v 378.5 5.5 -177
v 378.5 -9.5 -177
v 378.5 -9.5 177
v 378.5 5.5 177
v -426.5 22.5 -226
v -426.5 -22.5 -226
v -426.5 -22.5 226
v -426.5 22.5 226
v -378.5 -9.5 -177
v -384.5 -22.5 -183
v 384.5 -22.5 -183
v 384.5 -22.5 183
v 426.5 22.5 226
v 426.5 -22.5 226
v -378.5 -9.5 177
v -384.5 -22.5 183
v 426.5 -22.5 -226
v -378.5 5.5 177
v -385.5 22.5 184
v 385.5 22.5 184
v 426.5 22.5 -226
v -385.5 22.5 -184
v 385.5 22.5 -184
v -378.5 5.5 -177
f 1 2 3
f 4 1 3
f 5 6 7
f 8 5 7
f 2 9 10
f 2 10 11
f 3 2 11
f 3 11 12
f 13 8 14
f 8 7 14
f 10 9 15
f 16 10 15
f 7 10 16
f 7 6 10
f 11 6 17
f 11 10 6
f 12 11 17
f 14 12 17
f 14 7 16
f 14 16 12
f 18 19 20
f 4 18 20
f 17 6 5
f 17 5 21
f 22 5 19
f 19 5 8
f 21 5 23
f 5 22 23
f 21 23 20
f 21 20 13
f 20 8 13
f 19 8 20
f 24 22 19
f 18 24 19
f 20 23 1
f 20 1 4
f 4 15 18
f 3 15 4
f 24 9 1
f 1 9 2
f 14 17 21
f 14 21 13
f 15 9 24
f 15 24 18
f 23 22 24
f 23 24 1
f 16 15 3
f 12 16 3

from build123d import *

# Parameters (mm, degrees)
F0_W     = 853
F0_H     = 452
F0_W_2   = 757
F0_H_2   = 354
F1_DEPTH = 22.5
F2_SIZE2 = 13
F2_SIZE  = 6
F3_SIZE2 = 7
F3_SIZE  = 17


with BuildPart() as f1:
    # F0 (on Front) → F1 (new body, symmetric)
    with BuildSketch(Plane.XZ):
        Rectangle(F0_W, F0_H)
        Rectangle(F0_W_2, F0_H_2, mode=Mode.SUBTRACT)
    extrude(amount=F1_DEPTH, both=True)

    # F2
    f2_edges = [f1.edges().sort_by_distance(p)[0] for p in [
        (0, -22.5, -177),
        (-378.5, -22.5, 0),
        (378.5, -22.5, 0),
        (0, -22.5, 177),
    ]]
    chamfer(f2_edges, length=F2_SIZE, length2=F2_SIZE2)

    # F3
    f3_edges = [f1.edges().sort_by_distance(p)[0] for p in [
        (0, 22.5, -177),
        (-378.5, 22.5, 0),
        (0, 22.5, 177),
        (378.5, 22.5, 0),
    ]]
    chamfer(f3_edges, length=F3_SIZE, length2=F3_SIZE2)


solid = f1.part
